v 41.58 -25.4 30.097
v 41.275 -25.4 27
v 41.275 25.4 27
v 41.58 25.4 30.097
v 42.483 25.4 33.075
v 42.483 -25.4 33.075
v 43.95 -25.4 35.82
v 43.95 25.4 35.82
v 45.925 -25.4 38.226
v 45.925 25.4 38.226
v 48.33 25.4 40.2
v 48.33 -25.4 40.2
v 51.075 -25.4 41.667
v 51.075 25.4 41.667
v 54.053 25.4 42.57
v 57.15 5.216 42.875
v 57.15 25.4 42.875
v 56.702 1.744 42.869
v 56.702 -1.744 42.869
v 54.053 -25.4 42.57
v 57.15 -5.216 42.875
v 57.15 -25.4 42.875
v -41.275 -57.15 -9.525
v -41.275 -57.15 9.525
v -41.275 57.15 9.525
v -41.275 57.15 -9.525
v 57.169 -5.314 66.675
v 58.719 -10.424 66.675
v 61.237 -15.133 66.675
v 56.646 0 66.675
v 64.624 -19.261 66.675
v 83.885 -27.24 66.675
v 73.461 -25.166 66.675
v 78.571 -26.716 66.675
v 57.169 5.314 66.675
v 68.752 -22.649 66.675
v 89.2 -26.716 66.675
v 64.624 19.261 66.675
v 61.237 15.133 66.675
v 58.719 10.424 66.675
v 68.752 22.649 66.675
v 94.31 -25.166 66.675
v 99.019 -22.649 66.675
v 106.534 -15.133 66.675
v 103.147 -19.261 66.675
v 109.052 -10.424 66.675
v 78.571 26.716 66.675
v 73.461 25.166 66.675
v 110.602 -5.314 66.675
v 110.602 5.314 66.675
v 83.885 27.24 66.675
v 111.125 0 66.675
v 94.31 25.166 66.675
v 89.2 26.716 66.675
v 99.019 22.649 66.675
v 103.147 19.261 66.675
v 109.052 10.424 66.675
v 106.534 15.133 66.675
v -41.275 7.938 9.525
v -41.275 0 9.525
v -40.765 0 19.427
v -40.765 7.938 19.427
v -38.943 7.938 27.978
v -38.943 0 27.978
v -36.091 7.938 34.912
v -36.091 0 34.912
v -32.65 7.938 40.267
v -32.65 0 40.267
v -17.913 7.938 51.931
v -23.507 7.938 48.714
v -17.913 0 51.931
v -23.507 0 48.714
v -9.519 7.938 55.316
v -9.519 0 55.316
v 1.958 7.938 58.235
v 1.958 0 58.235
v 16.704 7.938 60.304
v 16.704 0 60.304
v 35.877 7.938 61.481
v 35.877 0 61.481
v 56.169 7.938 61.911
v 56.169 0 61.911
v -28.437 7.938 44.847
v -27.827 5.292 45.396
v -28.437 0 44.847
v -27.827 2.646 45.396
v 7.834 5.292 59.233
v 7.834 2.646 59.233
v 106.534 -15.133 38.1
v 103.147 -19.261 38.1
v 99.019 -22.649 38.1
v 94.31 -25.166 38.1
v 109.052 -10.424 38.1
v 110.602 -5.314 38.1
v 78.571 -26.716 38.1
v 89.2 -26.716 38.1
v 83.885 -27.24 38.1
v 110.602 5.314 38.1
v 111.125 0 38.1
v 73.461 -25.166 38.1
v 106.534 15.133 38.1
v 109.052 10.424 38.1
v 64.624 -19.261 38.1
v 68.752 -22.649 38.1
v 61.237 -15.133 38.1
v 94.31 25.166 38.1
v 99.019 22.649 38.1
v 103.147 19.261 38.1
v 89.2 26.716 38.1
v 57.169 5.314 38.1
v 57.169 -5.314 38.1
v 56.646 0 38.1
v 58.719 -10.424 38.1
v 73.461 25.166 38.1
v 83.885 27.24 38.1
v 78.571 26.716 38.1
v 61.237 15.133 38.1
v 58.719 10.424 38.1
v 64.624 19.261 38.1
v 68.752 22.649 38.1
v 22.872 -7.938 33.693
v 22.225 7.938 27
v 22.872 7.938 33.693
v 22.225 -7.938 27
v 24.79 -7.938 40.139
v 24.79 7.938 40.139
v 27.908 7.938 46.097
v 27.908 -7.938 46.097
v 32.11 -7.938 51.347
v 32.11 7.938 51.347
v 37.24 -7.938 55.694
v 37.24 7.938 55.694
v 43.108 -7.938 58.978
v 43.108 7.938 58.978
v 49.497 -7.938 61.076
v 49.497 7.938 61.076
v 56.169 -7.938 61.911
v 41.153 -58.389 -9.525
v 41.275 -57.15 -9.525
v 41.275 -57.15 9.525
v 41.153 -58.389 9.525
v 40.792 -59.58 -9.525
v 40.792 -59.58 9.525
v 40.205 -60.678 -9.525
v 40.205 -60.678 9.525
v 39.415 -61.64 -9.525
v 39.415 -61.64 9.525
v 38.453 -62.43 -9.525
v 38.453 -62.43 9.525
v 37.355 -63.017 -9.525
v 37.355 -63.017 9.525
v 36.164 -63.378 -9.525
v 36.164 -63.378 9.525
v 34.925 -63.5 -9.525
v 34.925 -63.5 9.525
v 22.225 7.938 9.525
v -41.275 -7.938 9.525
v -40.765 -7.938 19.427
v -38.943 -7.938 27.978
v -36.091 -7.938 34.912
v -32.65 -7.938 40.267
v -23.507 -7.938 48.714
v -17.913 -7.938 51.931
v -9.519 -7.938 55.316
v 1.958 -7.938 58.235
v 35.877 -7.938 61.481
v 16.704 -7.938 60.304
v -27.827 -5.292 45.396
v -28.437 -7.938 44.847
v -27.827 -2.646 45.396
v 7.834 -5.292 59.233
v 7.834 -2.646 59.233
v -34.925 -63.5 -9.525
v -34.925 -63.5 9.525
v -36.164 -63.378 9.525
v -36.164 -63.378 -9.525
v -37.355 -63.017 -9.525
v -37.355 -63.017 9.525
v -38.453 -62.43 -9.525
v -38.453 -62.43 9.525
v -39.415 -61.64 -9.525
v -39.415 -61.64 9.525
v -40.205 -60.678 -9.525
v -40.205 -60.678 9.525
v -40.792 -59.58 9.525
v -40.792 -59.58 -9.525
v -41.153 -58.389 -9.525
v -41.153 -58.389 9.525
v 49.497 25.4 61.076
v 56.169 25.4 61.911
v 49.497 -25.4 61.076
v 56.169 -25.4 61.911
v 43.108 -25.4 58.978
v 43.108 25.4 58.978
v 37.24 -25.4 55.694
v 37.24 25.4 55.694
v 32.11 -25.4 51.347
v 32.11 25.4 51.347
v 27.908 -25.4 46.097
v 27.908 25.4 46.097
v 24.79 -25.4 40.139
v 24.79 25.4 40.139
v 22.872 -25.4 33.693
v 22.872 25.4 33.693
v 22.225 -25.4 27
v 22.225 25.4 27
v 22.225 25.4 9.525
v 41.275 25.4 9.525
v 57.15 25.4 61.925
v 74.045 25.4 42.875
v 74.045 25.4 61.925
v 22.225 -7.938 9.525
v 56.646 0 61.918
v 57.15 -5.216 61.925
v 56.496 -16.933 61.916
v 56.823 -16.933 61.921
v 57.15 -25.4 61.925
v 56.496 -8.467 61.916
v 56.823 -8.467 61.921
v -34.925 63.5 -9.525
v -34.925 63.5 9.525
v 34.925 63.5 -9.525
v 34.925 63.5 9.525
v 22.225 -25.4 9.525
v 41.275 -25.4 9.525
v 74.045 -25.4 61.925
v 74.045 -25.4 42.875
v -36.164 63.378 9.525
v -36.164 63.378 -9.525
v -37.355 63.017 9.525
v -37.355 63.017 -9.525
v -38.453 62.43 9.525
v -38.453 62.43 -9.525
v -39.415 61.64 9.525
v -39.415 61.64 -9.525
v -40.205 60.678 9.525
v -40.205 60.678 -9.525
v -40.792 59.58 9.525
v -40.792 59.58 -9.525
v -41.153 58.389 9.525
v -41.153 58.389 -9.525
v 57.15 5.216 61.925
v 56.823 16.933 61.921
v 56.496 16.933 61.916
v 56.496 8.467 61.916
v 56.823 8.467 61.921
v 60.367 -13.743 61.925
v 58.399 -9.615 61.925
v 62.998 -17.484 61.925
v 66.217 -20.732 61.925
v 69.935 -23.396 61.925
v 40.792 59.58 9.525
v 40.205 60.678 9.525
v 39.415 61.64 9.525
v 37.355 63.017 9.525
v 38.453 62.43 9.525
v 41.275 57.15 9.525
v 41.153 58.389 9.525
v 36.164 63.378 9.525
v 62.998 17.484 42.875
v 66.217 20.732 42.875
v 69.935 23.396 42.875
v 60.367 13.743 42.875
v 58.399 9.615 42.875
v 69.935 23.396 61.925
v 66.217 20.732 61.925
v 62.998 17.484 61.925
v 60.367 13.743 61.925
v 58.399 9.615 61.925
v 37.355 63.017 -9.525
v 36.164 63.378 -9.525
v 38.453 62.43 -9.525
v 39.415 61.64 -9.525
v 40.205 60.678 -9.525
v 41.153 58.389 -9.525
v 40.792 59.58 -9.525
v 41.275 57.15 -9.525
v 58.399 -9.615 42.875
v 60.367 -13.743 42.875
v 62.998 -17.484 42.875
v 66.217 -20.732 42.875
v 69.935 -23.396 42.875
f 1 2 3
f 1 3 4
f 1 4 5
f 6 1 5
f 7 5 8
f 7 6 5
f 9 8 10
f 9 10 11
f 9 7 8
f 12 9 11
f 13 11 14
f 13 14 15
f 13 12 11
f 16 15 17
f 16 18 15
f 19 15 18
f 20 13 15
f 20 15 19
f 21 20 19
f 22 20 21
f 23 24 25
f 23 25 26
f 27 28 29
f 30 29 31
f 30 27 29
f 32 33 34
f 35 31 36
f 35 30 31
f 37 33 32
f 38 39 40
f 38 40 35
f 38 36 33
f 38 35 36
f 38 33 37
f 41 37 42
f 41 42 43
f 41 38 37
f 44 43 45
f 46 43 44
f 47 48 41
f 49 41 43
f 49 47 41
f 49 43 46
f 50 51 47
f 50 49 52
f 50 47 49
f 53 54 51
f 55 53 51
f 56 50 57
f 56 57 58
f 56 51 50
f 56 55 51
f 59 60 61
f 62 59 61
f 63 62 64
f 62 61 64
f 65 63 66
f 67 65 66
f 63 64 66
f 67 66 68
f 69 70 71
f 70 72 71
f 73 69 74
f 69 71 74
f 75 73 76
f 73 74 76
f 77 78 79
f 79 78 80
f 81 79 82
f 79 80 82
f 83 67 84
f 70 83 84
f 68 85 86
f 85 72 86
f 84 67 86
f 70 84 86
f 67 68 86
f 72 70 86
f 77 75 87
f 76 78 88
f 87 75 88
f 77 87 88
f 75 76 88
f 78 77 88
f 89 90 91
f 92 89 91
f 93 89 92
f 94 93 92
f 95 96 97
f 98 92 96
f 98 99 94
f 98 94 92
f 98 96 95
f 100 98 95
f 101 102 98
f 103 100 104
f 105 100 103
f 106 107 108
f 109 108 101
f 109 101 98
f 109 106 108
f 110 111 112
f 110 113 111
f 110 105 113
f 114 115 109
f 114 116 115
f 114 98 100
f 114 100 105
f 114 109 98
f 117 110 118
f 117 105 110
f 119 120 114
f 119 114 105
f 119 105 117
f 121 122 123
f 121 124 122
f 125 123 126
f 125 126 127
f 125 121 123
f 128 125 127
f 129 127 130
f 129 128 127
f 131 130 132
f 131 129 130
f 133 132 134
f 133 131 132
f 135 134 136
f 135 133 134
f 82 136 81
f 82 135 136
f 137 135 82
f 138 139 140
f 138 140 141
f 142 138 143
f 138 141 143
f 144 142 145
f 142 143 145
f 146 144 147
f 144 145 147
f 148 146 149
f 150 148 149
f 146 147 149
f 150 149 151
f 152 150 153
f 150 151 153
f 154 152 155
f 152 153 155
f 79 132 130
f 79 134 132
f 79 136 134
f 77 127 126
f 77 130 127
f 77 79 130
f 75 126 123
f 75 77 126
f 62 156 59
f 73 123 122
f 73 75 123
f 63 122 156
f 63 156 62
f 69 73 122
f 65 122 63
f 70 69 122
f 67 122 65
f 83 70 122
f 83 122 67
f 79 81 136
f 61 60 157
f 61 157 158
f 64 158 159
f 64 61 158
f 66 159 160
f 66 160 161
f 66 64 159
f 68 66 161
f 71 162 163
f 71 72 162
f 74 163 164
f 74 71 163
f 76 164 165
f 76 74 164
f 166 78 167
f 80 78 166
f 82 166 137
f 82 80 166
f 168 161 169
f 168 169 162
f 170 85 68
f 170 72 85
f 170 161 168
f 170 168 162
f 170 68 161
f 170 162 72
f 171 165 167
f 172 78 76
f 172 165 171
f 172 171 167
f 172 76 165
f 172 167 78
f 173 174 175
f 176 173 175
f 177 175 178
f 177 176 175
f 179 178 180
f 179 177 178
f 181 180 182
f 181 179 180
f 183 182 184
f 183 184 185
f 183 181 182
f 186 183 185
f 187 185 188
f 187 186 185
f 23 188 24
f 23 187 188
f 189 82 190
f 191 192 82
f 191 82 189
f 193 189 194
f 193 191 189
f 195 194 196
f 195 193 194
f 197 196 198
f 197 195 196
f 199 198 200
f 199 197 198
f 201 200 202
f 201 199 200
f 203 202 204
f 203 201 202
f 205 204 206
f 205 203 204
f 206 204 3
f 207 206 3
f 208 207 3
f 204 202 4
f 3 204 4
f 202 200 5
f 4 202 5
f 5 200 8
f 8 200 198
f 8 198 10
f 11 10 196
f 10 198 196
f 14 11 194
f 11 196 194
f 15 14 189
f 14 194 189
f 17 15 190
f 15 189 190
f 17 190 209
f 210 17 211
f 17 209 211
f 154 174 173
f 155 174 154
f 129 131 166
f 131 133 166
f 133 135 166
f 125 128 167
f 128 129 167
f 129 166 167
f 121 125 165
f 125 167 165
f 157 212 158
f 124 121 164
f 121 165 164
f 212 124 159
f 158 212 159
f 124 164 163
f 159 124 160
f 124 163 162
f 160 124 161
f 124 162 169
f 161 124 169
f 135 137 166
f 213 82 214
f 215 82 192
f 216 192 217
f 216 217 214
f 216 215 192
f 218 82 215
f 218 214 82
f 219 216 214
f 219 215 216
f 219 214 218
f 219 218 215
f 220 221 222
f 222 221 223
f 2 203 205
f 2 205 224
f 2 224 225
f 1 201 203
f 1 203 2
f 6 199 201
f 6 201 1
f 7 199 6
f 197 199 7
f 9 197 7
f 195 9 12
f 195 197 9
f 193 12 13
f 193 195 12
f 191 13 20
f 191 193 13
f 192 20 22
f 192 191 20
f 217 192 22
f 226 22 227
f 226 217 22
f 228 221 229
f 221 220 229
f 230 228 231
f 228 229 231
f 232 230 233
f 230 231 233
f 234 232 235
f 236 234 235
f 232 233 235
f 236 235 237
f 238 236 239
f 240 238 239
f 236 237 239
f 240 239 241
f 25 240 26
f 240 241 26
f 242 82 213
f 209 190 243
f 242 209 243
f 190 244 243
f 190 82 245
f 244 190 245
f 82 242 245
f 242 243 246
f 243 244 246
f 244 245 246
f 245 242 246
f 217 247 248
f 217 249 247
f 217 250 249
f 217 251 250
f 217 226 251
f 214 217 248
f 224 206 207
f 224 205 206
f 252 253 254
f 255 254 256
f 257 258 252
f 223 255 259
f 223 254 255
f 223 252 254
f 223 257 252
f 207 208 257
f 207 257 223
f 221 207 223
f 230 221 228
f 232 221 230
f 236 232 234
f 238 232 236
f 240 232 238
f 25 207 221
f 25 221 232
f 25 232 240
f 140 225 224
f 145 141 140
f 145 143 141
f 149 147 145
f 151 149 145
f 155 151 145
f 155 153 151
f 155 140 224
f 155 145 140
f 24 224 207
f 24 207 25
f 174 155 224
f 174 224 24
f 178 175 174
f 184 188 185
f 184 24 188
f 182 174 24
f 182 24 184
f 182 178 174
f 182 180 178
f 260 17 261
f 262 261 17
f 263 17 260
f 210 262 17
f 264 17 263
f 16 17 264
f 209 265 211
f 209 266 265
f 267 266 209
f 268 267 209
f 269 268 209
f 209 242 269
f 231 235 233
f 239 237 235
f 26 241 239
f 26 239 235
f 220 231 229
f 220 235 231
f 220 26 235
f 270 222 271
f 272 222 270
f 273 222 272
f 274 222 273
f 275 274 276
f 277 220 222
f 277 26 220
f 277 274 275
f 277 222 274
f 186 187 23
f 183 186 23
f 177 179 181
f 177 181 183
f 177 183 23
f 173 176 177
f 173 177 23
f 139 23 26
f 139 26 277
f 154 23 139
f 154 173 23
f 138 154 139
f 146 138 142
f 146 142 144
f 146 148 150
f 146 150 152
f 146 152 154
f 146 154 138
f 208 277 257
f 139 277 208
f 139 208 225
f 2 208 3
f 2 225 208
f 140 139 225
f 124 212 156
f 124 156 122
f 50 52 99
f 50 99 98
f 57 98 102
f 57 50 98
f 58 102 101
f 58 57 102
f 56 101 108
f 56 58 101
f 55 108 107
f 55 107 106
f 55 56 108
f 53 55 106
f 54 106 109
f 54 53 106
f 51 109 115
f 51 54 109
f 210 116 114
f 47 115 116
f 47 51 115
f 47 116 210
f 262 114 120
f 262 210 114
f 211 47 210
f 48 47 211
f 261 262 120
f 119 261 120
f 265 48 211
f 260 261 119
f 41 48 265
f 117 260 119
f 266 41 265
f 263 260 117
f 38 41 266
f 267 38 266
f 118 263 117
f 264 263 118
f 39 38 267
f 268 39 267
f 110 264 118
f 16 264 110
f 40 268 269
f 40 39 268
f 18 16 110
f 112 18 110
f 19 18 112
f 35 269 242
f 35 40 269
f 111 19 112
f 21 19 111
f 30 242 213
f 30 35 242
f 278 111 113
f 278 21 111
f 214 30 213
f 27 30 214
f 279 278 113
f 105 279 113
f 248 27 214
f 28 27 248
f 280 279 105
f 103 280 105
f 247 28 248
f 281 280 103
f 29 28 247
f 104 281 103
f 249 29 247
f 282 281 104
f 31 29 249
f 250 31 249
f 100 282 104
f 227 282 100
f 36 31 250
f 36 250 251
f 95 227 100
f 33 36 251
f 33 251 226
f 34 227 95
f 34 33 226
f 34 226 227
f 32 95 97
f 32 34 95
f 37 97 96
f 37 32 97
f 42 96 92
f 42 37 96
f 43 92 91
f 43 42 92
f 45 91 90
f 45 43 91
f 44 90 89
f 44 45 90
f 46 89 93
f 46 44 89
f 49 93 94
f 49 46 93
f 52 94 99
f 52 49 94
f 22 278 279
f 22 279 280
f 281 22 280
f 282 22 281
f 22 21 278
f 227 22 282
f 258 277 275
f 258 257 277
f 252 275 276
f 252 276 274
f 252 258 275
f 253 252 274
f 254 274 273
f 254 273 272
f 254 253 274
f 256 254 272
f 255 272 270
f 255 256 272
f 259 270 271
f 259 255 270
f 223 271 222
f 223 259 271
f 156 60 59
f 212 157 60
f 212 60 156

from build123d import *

# Parameters (mm, degrees)
F1_DEPTH = 63.5
F0_W     = 23.56047028
F0_H     = 19.05
F2_DEPTH = 25.4
F3_DEPTH = 7.9375
F5_R     = 6.35


with BuildPart() as f1:
    # F0 (on Front) → F1 (new body, symmetric)
    with BuildSketch(Plane.XZ):
        Polygon((22.225, 9.525), (-41.275, 9.525), (-41.275, -9.525), (41.275, -9.525), (41.275, 9.525), align=None)
    extrude(amount=F1_DEPTH, both=True)

    # F0 (on Front) → F2 (join, symmetric)
    with BuildSketch(Plane.XZ):
        with BuildLine():
            Line((22.225, 27.0002), (22.225, 9.525))
            Line((22.225, 9.525), (41.275, 9.525))
            Line((41.275, 9.525), (41.275, 27.0002))
            ThreePointArc((41.275, 27.0002), (45.9246798487, 38.2255201513), (57.15, 42.8752))
            Line((57.15, 42.8752), (60.325, 42.8752))
            Line((60.325, 42.8752), (60.325, 61.9252))
            Line((60.325, 61.9252), (57.15, 61.9252))
            add(Edge.make_bspline(
                [(56.1691485307, 61.9114239172), (56.4959134974, 61.9160287389), (56.8228676449, 61.9206165968), (57.15, 61.9252)],
                knots=[110.8013806044, 110.8013806044, 110.8013806044, 110.8013806044, 111.5045361635, 111.5045361635, 111.5045361635, 111.5045361635], degree=3))
            ThreePointArc((56.1691485307, 61.9114239172), (32.1099135129, 51.3466513578), (22.225, 27.0002))
        make_face()
        with Locations((72.10523514, 52.4002)):
            Rectangle(F0_W, F0_H)
    extrude(amount=F2_DEPTH, both=True)

    # F0 (on Front) → F4 (revolve)
    with BuildSketch(Plane.XZ):
        Polygon((83.88547028, 66.675), (83.88547028, 61.9252), (83.88547028, 42.8752), (83.88547028, 38.1), (111.125, 38.1), (111.125, 66.675), align=None)
    revolve(axis=Axis((83.88547028, 0, 52.3875), (0, 0, 1)))

    # F5
    f5_edges = [f1.edges().sort_by_distance(p)[0] for p in [
        (-41.275, -63.5, 0),
        (41.275, -63.5, 0),
        (41.275, 63.5, 0),
        (-41.275, 63.5, 0),
    ]]
    fillet(f5_edges, radius=F5_R)


with BuildPart() as f3:
    # F0 (on Front) → F3 (new body, symmetric)
    with BuildSketch(Plane.XZ):
        with BuildLine():
            add(Edge.make_bspline(
                [(-41.275, 9.525), (-42.1148808666, 60.0389676793), (4.6783952045, 61.1858083656), (56.1691485307, 61.9114239172)],
                knots=[0, 0, 0, 0, 110.8013806044, 110.8013806044, 110.8013806044, 110.8013806044], degree=3))
            Line((-41.275, 9.525), (22.225, 9.525))
            Line((22.225, 9.525), (22.225, 27.0002))
            ThreePointArc((22.225, 27.0002), (32.1099135129, 51.3466513578), (56.1691485307, 61.9114239172))
        make_face()
    extrude(amount=F3_DEPTH, both=True)


solid = Compound([f1.part, f3.part])
